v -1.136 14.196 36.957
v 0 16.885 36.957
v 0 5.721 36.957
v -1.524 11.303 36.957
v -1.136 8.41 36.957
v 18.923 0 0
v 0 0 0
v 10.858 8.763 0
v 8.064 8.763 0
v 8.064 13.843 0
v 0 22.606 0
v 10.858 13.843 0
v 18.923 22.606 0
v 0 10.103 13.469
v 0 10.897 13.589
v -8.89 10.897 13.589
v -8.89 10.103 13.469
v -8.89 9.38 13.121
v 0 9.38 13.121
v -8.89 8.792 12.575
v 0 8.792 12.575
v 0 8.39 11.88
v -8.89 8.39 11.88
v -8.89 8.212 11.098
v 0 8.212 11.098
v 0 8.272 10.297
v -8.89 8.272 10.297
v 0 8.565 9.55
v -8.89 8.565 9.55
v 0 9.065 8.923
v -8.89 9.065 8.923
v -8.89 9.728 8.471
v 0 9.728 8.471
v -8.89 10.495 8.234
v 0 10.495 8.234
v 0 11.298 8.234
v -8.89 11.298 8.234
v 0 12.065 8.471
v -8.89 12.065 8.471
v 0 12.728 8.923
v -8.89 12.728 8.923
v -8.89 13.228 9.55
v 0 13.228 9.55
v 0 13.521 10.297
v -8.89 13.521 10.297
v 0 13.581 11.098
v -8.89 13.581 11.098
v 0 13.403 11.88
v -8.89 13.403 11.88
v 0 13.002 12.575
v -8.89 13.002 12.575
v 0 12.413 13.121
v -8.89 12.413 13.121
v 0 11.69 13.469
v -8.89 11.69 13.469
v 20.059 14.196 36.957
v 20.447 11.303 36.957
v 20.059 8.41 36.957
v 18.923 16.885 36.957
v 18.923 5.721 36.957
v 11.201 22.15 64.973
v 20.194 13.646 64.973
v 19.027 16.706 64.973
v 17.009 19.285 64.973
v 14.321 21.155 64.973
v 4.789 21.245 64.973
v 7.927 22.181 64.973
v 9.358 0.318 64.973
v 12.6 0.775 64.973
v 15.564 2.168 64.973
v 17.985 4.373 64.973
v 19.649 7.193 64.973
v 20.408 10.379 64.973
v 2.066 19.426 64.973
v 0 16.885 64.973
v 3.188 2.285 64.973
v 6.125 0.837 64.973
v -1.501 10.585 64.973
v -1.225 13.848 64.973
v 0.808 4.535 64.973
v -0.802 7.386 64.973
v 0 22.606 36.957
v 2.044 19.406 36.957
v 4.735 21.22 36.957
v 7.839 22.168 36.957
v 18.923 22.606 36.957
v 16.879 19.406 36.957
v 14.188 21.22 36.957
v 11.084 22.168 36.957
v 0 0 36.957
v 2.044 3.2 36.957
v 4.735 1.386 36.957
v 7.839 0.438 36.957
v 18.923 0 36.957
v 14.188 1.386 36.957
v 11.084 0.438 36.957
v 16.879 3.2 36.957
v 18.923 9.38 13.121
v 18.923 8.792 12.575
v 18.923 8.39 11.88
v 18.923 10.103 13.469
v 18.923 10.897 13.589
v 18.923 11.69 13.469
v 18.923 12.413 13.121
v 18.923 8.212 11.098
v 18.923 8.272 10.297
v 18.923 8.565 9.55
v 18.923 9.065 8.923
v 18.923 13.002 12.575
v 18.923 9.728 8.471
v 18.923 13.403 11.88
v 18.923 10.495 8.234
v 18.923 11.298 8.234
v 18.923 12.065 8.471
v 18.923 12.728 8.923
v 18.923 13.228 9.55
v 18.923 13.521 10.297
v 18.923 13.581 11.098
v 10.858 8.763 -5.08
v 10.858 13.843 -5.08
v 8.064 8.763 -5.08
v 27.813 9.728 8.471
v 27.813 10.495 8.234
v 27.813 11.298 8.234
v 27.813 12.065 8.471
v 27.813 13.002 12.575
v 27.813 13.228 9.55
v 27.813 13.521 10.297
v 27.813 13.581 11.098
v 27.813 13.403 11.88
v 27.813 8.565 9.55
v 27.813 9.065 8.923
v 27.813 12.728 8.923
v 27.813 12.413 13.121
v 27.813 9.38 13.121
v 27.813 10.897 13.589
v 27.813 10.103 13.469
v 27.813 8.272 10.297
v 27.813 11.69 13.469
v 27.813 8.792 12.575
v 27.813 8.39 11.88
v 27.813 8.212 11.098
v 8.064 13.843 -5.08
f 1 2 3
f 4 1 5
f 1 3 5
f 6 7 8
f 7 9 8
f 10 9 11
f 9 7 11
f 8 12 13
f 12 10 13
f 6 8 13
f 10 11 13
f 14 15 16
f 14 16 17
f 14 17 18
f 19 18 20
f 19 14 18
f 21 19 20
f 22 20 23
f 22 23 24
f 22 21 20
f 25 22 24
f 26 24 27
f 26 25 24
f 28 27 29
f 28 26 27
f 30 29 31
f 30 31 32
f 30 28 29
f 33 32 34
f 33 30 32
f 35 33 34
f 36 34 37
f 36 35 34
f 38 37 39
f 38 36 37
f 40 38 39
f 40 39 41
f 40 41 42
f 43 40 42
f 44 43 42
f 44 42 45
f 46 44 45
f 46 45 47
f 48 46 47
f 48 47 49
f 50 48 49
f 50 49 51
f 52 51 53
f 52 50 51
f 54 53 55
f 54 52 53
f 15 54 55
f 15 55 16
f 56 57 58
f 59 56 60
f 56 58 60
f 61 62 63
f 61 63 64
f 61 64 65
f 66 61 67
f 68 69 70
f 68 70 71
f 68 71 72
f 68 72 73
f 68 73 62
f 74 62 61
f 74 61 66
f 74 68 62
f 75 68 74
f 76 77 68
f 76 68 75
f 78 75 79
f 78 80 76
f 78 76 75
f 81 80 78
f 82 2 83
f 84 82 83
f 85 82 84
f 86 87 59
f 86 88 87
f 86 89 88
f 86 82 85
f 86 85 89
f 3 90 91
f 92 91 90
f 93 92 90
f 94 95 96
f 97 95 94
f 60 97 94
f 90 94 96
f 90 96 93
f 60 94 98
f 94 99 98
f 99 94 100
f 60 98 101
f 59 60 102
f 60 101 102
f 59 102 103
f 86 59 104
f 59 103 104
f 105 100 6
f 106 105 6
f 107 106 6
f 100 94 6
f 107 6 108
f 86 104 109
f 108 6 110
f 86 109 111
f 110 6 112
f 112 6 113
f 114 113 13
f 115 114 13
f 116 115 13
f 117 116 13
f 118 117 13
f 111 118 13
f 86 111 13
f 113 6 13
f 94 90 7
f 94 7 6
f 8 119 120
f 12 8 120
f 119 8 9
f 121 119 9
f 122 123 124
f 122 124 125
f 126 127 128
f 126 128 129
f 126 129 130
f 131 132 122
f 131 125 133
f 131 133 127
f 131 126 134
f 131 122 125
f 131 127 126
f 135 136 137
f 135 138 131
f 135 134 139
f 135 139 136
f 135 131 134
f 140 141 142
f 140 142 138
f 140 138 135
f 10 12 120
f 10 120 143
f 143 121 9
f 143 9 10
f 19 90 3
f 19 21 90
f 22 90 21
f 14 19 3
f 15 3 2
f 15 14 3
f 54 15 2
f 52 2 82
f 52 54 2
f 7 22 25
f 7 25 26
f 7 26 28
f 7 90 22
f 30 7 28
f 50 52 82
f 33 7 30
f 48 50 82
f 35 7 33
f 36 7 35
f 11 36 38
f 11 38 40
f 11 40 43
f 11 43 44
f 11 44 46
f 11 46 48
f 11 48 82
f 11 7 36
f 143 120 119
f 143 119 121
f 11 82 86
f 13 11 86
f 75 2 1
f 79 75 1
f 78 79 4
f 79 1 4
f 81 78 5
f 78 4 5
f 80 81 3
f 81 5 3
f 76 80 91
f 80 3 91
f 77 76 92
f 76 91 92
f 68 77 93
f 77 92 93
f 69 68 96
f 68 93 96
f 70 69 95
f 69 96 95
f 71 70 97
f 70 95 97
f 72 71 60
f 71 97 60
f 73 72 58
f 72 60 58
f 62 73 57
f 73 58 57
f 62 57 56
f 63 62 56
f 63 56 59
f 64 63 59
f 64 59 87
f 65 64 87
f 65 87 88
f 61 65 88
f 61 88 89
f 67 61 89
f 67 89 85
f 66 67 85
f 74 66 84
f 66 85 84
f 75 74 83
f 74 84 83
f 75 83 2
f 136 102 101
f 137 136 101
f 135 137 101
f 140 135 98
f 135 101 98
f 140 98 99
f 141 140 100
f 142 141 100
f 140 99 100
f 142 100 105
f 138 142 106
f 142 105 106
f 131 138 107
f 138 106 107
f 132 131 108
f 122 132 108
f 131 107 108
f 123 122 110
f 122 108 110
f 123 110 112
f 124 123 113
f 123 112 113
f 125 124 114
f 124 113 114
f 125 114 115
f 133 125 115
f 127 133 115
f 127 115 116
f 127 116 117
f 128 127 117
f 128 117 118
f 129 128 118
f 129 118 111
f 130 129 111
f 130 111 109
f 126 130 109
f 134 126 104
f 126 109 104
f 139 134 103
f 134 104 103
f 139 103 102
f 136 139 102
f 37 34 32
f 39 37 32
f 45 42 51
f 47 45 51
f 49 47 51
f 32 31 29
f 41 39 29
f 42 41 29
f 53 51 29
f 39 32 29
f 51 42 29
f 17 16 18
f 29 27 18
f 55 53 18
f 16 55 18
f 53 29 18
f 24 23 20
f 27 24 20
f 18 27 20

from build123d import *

# Parameters (mm, degrees)
SKETCH1_W           = 18.923
SKETCH1_H           = 22.606
BOSS_EXTRUDE1_DEPTH = 36.957
SKETCH2_R           = 10.9855
BOSS_EXTRUDE2_DEPTH = 28.0162
SKETCH3_W           = 2.794
SKETCH3_H           = 5.08
BOSS_EXTRUDE3_DEPTH = 5.08
SKETCH4_R           = 2.6924
BOSS_EXTRUDE4_DEPTH = 8.89


with BuildPart() as part:
    # Sketch1 → Boss-Extrude1 (new body)
    with BuildSketch(Plane.XY):
        with Locations((9.4615, 11.303)):
            Rectangle(SKETCH1_W, SKETCH1_H)
    extrude(amount=BOSS_EXTRUDE1_DEPTH)

    # Sketch2 → Boss-Extrude2 (add)
    with BuildSketch(Plane.XY.offset(36.957)):
        with Locations(Location((9.4615, 11.303, 0), (0, 0, 149.45966787))):
            Circle(SKETCH2_R)
    extrude(amount=BOSS_EXTRUDE2_DEPTH)

    # Sketch3 → Boss-Extrude3 (add)
    with BuildSketch(Plane(origin=(0, 0, 0), x_dir=(-1, 0, 0), z_dir=(0, 0, -1))):
        with Locations((-9.4615, 11.303)):
            Rectangle(SKETCH3_W, SKETCH3_H)
    extrude(amount=BOSS_EXTRUDE3_DEPTH)

    # Sketch4 → Boss-Extrude4 (add)
    with BuildSketch(Plane(origin=(18.923, 0, 0), x_dir=(0, 0, -1), z_dir=(1, 0, 0))):
        with Locations(Location((-10.8966, 10.8966, 0), (0, 0, 180))):
            Circle(SKETCH4_R)
    boss_extrude4 = extrude(amount=BOSS_EXTRUDE4_DEPTH)

    # Mirror1: Boss-Extrude4 across plane
    add(boss_extrude4.mirror(Plane(origin=(9.4615, 0, 0), x_dir=(0, 0, 1), z_dir=(1, 0, 0))))


solid = part.part
